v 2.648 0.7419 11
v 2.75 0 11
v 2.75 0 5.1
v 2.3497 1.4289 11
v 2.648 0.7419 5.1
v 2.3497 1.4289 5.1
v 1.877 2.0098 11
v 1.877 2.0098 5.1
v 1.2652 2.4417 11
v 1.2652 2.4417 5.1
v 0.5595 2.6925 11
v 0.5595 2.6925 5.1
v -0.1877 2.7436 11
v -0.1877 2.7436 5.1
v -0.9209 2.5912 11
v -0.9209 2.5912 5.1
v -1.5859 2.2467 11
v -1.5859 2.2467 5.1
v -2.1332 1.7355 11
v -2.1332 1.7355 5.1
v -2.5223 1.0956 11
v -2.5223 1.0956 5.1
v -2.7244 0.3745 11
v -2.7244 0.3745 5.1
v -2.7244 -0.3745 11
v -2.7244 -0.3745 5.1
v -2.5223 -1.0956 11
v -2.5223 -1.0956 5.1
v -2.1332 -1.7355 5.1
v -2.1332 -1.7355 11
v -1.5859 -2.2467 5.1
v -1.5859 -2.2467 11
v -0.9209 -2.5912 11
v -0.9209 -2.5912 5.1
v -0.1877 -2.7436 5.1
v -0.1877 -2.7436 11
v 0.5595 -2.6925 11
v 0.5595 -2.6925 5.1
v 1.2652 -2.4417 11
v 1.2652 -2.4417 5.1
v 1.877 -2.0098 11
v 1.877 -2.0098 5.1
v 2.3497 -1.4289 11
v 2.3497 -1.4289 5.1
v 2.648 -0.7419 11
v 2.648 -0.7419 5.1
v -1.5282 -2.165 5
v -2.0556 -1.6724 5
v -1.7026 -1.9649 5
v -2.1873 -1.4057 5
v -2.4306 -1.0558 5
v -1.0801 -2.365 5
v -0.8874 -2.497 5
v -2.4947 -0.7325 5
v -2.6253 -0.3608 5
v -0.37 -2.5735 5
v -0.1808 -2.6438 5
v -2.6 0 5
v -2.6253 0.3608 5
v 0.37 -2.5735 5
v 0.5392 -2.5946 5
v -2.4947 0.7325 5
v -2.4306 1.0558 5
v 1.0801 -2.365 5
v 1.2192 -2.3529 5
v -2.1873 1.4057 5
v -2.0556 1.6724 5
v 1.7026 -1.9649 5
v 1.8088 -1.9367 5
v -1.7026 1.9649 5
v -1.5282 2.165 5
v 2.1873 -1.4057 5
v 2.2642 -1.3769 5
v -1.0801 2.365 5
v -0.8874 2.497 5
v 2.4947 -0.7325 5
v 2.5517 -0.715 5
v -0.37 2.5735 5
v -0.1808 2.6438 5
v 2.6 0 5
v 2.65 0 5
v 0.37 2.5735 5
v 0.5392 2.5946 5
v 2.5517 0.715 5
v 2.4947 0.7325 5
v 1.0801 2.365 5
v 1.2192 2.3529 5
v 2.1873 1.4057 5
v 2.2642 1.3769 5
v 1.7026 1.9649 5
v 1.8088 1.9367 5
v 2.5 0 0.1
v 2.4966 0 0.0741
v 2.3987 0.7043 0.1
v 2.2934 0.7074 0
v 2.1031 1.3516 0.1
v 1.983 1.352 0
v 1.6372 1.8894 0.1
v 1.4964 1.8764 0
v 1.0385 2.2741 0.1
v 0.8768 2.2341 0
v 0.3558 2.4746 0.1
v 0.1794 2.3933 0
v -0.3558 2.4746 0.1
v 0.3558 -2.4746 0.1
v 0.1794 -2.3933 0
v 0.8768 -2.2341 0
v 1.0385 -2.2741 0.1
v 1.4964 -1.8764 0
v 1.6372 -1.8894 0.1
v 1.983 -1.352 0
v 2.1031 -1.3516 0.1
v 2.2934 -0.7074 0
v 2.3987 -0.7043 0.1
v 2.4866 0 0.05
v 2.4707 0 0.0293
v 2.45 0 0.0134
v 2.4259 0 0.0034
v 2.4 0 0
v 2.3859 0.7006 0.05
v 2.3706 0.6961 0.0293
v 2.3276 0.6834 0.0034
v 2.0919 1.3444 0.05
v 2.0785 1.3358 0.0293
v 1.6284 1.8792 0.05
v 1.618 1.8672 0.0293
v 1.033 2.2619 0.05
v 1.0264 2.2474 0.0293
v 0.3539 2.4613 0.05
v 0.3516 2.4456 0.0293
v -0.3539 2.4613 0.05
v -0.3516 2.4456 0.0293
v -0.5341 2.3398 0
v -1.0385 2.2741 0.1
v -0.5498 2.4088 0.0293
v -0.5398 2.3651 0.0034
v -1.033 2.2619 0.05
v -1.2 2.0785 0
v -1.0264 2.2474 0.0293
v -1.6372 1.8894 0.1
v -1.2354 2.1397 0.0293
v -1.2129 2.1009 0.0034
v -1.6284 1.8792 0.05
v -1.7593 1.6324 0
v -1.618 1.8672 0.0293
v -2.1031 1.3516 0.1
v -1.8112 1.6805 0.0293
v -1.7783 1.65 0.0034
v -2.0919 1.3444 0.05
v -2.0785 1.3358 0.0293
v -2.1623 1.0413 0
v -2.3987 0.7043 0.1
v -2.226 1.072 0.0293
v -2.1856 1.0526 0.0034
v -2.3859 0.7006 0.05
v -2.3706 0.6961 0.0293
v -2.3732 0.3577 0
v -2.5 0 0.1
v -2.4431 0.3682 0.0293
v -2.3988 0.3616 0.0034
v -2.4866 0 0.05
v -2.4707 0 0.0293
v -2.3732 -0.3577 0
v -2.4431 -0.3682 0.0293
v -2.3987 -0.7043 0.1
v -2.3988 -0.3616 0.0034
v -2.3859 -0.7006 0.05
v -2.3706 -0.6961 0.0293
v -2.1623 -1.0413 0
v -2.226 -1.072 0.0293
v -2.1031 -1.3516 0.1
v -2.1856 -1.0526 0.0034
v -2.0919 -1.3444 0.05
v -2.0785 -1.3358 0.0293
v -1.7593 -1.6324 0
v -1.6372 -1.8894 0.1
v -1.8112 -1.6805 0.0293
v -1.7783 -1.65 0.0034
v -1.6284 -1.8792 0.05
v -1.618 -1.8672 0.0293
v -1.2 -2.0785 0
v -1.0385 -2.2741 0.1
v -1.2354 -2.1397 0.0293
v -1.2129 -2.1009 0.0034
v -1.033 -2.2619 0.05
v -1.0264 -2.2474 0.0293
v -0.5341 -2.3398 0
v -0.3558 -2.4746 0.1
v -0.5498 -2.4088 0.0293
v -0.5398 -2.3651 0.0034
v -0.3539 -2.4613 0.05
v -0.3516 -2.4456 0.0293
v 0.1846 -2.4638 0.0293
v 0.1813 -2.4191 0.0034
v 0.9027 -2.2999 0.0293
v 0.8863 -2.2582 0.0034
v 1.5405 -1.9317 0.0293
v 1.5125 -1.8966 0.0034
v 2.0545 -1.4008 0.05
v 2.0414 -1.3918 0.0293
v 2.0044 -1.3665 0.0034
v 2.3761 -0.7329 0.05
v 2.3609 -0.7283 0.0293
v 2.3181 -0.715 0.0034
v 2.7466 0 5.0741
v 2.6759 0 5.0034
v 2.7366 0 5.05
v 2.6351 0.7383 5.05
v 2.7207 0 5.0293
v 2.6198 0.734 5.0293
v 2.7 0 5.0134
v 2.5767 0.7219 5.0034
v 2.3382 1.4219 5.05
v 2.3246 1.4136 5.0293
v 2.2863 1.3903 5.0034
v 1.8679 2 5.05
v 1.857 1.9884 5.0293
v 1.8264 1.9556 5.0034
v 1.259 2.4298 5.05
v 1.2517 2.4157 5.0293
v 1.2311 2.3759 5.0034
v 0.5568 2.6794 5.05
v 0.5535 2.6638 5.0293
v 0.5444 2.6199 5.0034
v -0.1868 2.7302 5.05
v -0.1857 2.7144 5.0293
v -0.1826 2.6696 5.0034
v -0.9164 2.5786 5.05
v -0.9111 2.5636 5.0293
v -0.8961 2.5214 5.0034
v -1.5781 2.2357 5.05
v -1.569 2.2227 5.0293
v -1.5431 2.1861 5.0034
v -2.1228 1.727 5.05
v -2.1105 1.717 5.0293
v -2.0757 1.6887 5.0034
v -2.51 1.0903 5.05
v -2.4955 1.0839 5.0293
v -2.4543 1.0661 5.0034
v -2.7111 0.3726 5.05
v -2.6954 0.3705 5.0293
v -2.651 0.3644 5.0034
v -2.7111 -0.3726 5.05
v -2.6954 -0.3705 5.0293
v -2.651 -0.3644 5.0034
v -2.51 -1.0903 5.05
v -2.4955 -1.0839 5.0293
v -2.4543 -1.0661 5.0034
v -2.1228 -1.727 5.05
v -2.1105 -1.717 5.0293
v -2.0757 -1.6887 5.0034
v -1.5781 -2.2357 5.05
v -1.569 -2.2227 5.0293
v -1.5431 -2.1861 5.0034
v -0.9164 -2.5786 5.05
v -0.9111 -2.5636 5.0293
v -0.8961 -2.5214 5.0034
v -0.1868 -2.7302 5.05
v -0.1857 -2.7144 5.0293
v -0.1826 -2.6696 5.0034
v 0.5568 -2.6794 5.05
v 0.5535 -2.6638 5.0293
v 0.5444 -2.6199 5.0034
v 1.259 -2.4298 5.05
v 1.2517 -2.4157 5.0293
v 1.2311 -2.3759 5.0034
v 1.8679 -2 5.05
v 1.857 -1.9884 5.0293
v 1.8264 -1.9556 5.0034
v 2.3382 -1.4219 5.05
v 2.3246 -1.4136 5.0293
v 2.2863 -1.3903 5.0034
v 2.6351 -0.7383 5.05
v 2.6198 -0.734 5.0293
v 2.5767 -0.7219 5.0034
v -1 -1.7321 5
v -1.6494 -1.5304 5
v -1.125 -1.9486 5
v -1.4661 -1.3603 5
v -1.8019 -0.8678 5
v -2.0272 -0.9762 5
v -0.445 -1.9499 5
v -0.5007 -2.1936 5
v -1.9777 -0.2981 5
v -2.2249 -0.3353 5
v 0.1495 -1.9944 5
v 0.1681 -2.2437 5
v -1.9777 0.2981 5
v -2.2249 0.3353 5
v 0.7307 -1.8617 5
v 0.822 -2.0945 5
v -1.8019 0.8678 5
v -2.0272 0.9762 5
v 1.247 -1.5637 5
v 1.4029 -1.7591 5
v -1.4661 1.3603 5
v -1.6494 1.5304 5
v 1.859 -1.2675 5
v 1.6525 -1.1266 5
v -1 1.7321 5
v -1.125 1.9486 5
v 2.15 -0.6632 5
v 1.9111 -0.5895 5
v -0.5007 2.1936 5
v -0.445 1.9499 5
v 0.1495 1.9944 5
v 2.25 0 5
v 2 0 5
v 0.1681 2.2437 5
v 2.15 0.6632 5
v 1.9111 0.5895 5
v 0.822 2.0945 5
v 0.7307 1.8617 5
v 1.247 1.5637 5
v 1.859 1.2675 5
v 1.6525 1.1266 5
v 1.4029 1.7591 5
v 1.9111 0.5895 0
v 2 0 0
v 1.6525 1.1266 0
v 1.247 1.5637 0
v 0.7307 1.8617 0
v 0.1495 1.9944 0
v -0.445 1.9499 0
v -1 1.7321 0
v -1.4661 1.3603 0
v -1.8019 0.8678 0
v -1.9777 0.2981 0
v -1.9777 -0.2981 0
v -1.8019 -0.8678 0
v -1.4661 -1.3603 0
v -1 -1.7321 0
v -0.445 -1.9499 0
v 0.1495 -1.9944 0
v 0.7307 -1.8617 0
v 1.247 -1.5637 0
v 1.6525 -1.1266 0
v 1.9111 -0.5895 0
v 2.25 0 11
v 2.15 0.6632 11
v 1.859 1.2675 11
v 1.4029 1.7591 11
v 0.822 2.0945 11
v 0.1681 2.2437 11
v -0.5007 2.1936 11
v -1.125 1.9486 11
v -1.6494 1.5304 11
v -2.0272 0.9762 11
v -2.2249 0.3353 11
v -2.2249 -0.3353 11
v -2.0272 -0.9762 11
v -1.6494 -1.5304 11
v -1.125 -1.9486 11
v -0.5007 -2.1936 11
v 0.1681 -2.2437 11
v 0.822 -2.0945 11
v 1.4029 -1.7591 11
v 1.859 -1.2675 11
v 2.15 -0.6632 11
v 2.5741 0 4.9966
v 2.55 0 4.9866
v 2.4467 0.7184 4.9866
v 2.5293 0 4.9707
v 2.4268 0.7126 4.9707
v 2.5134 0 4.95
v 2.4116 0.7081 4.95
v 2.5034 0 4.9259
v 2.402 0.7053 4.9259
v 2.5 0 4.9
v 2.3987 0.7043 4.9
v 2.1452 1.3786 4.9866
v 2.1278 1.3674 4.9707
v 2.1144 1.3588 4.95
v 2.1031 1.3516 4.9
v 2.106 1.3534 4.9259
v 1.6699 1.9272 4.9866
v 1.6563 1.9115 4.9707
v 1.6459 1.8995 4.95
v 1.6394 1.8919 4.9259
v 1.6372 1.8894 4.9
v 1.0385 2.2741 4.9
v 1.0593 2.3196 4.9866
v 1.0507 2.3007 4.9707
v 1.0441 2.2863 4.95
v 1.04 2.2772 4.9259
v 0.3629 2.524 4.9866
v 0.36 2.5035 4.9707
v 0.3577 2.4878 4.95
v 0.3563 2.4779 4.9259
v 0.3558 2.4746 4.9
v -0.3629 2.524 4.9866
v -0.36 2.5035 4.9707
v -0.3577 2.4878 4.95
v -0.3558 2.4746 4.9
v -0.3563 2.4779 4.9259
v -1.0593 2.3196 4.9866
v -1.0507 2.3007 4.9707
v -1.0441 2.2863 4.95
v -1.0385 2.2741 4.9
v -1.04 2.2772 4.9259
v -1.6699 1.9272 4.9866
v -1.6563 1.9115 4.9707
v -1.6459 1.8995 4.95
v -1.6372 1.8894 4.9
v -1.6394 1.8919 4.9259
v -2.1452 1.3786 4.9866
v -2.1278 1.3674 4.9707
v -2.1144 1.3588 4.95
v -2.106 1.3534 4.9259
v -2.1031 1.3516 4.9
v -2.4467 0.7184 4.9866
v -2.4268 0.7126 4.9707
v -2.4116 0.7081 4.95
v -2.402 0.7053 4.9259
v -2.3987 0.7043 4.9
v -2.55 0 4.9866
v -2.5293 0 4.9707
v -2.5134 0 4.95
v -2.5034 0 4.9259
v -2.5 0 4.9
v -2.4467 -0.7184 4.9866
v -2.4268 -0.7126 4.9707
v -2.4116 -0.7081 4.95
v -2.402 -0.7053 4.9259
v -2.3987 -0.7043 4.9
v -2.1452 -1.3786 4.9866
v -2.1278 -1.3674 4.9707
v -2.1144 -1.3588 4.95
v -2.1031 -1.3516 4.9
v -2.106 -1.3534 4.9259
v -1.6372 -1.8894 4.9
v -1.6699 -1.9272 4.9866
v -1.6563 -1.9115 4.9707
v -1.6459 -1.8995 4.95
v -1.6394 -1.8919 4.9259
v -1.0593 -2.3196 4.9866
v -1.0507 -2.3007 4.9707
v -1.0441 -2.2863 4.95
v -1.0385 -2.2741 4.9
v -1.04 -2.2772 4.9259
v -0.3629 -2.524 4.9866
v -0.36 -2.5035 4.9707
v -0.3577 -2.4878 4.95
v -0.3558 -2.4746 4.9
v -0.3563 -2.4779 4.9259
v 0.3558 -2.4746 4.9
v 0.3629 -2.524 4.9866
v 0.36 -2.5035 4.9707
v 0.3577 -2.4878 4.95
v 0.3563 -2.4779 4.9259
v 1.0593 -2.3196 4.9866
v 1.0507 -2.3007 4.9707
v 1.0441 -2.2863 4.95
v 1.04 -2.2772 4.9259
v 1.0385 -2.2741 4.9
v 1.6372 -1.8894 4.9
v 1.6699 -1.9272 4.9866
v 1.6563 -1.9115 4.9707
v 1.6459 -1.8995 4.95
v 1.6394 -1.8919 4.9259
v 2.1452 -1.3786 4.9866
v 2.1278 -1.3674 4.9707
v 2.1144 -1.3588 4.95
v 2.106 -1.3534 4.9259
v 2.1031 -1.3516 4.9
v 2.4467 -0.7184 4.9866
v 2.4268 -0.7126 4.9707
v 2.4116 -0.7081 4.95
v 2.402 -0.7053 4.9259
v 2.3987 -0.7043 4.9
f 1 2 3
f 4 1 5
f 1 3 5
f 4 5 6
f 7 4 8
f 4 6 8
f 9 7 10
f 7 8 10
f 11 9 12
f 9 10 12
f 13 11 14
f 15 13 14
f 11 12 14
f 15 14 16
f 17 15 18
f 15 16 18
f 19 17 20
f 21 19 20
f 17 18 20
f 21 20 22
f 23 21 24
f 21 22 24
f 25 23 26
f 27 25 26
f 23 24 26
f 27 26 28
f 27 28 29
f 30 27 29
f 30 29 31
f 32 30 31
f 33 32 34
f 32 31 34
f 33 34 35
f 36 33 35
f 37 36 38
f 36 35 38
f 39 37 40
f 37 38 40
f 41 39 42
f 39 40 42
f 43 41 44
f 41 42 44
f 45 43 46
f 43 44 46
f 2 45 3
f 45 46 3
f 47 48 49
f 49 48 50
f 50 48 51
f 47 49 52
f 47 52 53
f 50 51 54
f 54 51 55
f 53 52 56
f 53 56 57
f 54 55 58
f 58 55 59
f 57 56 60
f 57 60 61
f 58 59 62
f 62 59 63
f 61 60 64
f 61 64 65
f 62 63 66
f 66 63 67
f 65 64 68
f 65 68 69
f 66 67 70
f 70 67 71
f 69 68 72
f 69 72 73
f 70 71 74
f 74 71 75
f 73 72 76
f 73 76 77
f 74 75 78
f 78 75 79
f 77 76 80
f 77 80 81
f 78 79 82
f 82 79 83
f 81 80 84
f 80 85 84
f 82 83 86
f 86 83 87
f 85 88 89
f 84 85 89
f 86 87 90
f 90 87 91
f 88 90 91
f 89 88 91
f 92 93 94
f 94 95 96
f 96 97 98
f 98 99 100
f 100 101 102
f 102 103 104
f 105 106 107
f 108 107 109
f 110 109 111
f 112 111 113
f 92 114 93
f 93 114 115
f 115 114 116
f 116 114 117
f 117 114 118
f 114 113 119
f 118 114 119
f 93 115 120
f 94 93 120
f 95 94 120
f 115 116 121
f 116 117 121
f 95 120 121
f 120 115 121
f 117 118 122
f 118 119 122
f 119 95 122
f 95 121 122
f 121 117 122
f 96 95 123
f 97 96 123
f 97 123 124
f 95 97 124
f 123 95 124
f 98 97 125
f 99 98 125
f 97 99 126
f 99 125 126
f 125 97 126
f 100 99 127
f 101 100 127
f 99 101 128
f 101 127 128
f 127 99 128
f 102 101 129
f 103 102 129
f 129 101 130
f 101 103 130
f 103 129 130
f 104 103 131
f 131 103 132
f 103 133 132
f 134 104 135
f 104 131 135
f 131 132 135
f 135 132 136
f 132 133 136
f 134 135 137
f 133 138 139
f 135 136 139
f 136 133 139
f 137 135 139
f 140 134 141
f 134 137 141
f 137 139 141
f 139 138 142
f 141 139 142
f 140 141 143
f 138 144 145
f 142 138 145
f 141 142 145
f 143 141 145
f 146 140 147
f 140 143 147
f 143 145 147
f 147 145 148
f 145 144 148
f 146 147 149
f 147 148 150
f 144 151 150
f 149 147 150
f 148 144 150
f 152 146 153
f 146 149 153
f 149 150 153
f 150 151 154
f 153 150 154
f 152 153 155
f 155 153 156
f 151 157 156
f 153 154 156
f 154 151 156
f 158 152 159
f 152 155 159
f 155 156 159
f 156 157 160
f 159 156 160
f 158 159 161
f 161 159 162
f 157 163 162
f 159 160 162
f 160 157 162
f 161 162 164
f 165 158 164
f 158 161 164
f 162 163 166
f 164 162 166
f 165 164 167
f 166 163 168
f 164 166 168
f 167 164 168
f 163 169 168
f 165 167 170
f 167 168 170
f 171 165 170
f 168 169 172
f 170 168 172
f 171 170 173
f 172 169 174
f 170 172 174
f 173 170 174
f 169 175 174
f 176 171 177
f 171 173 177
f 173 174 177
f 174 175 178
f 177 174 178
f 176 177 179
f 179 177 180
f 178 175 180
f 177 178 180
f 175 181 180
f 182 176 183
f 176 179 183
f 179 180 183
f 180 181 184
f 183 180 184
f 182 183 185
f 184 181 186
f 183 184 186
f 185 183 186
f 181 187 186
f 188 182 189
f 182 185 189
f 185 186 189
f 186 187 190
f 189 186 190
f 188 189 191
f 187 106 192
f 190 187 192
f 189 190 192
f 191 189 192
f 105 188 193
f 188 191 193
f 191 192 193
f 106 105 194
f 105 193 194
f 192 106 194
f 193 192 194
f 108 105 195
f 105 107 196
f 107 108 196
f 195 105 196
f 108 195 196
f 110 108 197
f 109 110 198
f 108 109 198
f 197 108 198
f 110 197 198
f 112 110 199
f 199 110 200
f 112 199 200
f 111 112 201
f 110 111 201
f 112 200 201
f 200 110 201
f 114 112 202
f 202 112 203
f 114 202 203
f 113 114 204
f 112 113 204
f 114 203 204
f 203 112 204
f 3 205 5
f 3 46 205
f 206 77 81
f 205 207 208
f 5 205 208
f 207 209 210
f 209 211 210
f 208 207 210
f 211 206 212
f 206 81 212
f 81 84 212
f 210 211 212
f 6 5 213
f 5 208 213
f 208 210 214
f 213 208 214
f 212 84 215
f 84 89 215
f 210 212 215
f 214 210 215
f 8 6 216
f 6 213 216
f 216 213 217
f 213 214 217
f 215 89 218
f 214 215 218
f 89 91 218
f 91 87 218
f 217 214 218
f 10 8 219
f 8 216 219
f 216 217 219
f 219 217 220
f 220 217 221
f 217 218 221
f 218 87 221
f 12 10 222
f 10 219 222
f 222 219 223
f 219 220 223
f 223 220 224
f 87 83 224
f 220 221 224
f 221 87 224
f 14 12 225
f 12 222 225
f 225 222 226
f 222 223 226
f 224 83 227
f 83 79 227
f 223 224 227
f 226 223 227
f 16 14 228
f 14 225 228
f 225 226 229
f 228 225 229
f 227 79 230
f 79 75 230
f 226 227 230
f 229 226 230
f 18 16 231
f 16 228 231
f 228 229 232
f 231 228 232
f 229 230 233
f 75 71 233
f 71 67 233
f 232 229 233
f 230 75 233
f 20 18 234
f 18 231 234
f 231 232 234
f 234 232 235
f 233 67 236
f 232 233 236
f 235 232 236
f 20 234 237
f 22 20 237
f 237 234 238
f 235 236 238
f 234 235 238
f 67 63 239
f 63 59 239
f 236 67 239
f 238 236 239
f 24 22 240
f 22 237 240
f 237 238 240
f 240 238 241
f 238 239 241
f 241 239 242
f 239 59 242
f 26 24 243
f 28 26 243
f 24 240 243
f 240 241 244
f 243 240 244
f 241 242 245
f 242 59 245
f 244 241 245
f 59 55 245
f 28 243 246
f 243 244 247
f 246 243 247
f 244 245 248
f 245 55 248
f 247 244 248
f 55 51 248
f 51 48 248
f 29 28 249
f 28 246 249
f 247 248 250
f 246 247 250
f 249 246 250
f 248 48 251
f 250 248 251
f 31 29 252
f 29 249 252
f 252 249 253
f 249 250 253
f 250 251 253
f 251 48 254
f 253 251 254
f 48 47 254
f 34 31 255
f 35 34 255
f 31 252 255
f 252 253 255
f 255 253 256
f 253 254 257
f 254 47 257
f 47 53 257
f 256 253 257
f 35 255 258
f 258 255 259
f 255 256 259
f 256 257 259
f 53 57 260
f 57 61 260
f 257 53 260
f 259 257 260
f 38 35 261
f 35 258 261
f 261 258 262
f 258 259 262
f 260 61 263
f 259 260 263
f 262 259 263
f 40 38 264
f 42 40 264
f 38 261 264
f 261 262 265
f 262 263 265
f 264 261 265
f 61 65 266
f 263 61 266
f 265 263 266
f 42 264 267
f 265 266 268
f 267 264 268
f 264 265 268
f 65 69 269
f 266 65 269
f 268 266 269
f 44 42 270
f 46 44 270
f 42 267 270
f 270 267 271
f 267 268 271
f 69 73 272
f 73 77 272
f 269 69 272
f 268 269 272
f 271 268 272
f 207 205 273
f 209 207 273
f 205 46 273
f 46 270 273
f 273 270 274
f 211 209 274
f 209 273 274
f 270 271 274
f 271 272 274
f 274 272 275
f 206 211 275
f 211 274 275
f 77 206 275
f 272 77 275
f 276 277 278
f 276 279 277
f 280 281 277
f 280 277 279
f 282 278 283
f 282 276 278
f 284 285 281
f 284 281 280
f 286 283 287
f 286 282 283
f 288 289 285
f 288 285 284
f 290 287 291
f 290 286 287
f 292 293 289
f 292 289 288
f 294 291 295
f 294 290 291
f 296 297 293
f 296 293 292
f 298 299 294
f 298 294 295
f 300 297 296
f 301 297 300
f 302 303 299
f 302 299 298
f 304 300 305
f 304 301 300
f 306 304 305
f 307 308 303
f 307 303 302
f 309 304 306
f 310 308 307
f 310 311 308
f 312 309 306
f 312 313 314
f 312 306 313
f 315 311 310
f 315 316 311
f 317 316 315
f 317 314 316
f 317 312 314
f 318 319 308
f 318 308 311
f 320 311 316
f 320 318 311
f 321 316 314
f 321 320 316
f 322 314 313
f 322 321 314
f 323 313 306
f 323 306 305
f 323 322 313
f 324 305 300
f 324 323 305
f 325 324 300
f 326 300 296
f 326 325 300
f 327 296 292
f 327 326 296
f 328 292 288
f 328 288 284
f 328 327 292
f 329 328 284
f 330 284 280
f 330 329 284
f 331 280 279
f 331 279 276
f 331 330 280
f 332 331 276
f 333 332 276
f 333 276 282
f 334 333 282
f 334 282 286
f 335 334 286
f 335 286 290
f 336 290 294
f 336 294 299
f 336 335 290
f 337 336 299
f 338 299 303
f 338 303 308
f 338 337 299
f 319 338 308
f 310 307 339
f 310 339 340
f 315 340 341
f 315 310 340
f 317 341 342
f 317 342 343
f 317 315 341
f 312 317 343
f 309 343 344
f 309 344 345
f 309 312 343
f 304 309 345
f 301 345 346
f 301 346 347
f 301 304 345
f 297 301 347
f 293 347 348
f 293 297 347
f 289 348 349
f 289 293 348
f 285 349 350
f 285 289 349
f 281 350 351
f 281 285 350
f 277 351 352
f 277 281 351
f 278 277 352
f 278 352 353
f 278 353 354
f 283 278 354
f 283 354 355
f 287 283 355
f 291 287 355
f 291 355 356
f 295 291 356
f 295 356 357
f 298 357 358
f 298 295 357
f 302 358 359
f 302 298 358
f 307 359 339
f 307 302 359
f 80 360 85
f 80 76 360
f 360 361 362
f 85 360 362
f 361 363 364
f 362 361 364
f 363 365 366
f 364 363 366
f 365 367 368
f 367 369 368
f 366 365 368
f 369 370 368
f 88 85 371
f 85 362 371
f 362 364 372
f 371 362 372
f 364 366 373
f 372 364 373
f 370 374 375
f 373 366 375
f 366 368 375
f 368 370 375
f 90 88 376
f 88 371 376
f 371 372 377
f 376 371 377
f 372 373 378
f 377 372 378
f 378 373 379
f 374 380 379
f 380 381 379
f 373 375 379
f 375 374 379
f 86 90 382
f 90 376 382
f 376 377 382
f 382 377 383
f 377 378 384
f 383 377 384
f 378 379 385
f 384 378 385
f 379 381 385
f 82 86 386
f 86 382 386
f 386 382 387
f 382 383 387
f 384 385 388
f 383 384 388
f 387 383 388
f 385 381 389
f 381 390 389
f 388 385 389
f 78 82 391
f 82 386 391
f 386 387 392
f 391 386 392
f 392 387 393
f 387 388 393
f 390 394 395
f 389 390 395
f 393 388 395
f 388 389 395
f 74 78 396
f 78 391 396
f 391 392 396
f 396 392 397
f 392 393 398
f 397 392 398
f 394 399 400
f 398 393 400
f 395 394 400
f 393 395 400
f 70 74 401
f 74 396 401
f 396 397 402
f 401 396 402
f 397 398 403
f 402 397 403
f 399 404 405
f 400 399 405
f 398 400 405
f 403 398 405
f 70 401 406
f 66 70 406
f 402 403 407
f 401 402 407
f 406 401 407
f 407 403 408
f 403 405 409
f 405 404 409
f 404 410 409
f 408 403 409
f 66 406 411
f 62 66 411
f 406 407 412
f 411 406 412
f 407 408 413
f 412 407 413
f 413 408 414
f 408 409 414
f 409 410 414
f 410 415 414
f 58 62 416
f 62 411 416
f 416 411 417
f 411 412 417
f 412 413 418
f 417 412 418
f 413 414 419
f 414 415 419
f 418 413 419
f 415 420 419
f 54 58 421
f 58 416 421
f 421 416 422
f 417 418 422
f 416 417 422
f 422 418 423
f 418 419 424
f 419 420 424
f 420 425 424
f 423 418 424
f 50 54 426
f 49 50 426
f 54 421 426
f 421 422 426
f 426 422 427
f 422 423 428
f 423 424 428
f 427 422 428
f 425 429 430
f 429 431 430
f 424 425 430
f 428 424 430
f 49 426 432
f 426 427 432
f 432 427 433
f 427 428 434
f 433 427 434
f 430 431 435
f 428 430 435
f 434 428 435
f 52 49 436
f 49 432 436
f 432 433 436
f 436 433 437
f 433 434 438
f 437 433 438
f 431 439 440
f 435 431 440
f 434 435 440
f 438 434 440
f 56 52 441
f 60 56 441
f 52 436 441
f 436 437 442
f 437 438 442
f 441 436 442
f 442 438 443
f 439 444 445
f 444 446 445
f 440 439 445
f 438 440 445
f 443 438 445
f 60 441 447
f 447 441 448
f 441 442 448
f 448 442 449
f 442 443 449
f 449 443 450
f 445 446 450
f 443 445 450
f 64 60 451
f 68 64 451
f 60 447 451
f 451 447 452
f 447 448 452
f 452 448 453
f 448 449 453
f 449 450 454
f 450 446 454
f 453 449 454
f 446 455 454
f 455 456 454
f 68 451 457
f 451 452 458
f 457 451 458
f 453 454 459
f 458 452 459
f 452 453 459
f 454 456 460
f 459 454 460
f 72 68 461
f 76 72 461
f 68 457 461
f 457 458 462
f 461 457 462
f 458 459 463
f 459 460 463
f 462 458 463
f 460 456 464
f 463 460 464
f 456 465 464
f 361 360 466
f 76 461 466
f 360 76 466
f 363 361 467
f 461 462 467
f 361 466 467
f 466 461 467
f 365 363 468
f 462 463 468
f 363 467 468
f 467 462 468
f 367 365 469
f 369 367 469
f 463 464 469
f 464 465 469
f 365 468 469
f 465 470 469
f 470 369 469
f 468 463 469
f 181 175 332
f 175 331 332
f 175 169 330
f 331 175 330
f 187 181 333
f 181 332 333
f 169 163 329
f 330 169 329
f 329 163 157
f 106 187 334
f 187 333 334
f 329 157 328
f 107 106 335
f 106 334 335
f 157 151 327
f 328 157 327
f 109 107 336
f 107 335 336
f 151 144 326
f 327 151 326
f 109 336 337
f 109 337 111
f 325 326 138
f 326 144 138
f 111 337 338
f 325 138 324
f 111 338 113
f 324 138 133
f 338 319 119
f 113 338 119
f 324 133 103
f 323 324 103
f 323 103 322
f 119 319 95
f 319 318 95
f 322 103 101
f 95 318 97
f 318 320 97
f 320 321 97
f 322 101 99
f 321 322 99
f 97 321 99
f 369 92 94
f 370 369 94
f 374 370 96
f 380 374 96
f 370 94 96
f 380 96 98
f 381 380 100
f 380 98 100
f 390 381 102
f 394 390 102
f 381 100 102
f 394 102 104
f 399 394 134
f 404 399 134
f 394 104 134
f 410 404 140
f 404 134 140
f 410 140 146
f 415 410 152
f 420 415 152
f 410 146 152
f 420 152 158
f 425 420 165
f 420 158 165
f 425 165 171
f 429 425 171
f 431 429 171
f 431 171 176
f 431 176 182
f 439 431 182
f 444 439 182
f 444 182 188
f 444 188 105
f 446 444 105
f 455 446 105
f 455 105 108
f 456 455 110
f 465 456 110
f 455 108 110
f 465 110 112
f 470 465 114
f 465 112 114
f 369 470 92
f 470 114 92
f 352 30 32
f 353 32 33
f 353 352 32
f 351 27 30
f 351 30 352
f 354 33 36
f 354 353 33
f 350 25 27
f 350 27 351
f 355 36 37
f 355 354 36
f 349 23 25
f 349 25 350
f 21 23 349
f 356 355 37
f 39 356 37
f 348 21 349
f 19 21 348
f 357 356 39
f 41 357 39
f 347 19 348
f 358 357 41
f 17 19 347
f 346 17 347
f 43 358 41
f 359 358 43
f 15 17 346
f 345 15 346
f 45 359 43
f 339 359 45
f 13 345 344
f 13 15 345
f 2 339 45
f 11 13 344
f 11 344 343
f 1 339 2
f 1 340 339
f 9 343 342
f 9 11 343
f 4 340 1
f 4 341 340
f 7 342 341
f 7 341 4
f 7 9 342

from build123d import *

# Parameters (mm, degrees)
SKETCH_1_R      = 2.5
SKETCH_1_R_2    = 2
EXTRUDE_1_DEPTH = 5
SKETCH_2_R      = 2.75
SKETCH_2_R_2    = 2.25
EXTRUDE_2_DEPTH = 6
FILLET_1_R      = 0.1


with BuildPart() as part:
    # Эскиз1 → Вытянуть1 (new body)
    with BuildSketch(Plane.XY):
        Circle(SKETCH_1_R)
        Circle(SKETCH_1_R_2, mode=Mode.SUBTRACT)
    extrude(amount=EXTRUDE_1_DEPTH)

    # Эскиз2 → Вытянуть2 (add)
    with BuildSketch(Plane.XY.offset(5)):
        Circle(SKETCH_2_R)
        Circle(SKETCH_2_R_2, mode=Mode.SUBTRACT)
    extrude(amount=EXTRUDE_2_DEPTH)

    # Скругление1
    fillet_1_edges = [part.edges().sort_by_distance(p)[0] for p in [
        (-2.5, 0, 0),
        (-2.5, 0, 5),
        (-2.75, 0, 5),
    ]]
    fillet(fillet_1_edges, radius=FILLET_1_R)


solid = part.part
